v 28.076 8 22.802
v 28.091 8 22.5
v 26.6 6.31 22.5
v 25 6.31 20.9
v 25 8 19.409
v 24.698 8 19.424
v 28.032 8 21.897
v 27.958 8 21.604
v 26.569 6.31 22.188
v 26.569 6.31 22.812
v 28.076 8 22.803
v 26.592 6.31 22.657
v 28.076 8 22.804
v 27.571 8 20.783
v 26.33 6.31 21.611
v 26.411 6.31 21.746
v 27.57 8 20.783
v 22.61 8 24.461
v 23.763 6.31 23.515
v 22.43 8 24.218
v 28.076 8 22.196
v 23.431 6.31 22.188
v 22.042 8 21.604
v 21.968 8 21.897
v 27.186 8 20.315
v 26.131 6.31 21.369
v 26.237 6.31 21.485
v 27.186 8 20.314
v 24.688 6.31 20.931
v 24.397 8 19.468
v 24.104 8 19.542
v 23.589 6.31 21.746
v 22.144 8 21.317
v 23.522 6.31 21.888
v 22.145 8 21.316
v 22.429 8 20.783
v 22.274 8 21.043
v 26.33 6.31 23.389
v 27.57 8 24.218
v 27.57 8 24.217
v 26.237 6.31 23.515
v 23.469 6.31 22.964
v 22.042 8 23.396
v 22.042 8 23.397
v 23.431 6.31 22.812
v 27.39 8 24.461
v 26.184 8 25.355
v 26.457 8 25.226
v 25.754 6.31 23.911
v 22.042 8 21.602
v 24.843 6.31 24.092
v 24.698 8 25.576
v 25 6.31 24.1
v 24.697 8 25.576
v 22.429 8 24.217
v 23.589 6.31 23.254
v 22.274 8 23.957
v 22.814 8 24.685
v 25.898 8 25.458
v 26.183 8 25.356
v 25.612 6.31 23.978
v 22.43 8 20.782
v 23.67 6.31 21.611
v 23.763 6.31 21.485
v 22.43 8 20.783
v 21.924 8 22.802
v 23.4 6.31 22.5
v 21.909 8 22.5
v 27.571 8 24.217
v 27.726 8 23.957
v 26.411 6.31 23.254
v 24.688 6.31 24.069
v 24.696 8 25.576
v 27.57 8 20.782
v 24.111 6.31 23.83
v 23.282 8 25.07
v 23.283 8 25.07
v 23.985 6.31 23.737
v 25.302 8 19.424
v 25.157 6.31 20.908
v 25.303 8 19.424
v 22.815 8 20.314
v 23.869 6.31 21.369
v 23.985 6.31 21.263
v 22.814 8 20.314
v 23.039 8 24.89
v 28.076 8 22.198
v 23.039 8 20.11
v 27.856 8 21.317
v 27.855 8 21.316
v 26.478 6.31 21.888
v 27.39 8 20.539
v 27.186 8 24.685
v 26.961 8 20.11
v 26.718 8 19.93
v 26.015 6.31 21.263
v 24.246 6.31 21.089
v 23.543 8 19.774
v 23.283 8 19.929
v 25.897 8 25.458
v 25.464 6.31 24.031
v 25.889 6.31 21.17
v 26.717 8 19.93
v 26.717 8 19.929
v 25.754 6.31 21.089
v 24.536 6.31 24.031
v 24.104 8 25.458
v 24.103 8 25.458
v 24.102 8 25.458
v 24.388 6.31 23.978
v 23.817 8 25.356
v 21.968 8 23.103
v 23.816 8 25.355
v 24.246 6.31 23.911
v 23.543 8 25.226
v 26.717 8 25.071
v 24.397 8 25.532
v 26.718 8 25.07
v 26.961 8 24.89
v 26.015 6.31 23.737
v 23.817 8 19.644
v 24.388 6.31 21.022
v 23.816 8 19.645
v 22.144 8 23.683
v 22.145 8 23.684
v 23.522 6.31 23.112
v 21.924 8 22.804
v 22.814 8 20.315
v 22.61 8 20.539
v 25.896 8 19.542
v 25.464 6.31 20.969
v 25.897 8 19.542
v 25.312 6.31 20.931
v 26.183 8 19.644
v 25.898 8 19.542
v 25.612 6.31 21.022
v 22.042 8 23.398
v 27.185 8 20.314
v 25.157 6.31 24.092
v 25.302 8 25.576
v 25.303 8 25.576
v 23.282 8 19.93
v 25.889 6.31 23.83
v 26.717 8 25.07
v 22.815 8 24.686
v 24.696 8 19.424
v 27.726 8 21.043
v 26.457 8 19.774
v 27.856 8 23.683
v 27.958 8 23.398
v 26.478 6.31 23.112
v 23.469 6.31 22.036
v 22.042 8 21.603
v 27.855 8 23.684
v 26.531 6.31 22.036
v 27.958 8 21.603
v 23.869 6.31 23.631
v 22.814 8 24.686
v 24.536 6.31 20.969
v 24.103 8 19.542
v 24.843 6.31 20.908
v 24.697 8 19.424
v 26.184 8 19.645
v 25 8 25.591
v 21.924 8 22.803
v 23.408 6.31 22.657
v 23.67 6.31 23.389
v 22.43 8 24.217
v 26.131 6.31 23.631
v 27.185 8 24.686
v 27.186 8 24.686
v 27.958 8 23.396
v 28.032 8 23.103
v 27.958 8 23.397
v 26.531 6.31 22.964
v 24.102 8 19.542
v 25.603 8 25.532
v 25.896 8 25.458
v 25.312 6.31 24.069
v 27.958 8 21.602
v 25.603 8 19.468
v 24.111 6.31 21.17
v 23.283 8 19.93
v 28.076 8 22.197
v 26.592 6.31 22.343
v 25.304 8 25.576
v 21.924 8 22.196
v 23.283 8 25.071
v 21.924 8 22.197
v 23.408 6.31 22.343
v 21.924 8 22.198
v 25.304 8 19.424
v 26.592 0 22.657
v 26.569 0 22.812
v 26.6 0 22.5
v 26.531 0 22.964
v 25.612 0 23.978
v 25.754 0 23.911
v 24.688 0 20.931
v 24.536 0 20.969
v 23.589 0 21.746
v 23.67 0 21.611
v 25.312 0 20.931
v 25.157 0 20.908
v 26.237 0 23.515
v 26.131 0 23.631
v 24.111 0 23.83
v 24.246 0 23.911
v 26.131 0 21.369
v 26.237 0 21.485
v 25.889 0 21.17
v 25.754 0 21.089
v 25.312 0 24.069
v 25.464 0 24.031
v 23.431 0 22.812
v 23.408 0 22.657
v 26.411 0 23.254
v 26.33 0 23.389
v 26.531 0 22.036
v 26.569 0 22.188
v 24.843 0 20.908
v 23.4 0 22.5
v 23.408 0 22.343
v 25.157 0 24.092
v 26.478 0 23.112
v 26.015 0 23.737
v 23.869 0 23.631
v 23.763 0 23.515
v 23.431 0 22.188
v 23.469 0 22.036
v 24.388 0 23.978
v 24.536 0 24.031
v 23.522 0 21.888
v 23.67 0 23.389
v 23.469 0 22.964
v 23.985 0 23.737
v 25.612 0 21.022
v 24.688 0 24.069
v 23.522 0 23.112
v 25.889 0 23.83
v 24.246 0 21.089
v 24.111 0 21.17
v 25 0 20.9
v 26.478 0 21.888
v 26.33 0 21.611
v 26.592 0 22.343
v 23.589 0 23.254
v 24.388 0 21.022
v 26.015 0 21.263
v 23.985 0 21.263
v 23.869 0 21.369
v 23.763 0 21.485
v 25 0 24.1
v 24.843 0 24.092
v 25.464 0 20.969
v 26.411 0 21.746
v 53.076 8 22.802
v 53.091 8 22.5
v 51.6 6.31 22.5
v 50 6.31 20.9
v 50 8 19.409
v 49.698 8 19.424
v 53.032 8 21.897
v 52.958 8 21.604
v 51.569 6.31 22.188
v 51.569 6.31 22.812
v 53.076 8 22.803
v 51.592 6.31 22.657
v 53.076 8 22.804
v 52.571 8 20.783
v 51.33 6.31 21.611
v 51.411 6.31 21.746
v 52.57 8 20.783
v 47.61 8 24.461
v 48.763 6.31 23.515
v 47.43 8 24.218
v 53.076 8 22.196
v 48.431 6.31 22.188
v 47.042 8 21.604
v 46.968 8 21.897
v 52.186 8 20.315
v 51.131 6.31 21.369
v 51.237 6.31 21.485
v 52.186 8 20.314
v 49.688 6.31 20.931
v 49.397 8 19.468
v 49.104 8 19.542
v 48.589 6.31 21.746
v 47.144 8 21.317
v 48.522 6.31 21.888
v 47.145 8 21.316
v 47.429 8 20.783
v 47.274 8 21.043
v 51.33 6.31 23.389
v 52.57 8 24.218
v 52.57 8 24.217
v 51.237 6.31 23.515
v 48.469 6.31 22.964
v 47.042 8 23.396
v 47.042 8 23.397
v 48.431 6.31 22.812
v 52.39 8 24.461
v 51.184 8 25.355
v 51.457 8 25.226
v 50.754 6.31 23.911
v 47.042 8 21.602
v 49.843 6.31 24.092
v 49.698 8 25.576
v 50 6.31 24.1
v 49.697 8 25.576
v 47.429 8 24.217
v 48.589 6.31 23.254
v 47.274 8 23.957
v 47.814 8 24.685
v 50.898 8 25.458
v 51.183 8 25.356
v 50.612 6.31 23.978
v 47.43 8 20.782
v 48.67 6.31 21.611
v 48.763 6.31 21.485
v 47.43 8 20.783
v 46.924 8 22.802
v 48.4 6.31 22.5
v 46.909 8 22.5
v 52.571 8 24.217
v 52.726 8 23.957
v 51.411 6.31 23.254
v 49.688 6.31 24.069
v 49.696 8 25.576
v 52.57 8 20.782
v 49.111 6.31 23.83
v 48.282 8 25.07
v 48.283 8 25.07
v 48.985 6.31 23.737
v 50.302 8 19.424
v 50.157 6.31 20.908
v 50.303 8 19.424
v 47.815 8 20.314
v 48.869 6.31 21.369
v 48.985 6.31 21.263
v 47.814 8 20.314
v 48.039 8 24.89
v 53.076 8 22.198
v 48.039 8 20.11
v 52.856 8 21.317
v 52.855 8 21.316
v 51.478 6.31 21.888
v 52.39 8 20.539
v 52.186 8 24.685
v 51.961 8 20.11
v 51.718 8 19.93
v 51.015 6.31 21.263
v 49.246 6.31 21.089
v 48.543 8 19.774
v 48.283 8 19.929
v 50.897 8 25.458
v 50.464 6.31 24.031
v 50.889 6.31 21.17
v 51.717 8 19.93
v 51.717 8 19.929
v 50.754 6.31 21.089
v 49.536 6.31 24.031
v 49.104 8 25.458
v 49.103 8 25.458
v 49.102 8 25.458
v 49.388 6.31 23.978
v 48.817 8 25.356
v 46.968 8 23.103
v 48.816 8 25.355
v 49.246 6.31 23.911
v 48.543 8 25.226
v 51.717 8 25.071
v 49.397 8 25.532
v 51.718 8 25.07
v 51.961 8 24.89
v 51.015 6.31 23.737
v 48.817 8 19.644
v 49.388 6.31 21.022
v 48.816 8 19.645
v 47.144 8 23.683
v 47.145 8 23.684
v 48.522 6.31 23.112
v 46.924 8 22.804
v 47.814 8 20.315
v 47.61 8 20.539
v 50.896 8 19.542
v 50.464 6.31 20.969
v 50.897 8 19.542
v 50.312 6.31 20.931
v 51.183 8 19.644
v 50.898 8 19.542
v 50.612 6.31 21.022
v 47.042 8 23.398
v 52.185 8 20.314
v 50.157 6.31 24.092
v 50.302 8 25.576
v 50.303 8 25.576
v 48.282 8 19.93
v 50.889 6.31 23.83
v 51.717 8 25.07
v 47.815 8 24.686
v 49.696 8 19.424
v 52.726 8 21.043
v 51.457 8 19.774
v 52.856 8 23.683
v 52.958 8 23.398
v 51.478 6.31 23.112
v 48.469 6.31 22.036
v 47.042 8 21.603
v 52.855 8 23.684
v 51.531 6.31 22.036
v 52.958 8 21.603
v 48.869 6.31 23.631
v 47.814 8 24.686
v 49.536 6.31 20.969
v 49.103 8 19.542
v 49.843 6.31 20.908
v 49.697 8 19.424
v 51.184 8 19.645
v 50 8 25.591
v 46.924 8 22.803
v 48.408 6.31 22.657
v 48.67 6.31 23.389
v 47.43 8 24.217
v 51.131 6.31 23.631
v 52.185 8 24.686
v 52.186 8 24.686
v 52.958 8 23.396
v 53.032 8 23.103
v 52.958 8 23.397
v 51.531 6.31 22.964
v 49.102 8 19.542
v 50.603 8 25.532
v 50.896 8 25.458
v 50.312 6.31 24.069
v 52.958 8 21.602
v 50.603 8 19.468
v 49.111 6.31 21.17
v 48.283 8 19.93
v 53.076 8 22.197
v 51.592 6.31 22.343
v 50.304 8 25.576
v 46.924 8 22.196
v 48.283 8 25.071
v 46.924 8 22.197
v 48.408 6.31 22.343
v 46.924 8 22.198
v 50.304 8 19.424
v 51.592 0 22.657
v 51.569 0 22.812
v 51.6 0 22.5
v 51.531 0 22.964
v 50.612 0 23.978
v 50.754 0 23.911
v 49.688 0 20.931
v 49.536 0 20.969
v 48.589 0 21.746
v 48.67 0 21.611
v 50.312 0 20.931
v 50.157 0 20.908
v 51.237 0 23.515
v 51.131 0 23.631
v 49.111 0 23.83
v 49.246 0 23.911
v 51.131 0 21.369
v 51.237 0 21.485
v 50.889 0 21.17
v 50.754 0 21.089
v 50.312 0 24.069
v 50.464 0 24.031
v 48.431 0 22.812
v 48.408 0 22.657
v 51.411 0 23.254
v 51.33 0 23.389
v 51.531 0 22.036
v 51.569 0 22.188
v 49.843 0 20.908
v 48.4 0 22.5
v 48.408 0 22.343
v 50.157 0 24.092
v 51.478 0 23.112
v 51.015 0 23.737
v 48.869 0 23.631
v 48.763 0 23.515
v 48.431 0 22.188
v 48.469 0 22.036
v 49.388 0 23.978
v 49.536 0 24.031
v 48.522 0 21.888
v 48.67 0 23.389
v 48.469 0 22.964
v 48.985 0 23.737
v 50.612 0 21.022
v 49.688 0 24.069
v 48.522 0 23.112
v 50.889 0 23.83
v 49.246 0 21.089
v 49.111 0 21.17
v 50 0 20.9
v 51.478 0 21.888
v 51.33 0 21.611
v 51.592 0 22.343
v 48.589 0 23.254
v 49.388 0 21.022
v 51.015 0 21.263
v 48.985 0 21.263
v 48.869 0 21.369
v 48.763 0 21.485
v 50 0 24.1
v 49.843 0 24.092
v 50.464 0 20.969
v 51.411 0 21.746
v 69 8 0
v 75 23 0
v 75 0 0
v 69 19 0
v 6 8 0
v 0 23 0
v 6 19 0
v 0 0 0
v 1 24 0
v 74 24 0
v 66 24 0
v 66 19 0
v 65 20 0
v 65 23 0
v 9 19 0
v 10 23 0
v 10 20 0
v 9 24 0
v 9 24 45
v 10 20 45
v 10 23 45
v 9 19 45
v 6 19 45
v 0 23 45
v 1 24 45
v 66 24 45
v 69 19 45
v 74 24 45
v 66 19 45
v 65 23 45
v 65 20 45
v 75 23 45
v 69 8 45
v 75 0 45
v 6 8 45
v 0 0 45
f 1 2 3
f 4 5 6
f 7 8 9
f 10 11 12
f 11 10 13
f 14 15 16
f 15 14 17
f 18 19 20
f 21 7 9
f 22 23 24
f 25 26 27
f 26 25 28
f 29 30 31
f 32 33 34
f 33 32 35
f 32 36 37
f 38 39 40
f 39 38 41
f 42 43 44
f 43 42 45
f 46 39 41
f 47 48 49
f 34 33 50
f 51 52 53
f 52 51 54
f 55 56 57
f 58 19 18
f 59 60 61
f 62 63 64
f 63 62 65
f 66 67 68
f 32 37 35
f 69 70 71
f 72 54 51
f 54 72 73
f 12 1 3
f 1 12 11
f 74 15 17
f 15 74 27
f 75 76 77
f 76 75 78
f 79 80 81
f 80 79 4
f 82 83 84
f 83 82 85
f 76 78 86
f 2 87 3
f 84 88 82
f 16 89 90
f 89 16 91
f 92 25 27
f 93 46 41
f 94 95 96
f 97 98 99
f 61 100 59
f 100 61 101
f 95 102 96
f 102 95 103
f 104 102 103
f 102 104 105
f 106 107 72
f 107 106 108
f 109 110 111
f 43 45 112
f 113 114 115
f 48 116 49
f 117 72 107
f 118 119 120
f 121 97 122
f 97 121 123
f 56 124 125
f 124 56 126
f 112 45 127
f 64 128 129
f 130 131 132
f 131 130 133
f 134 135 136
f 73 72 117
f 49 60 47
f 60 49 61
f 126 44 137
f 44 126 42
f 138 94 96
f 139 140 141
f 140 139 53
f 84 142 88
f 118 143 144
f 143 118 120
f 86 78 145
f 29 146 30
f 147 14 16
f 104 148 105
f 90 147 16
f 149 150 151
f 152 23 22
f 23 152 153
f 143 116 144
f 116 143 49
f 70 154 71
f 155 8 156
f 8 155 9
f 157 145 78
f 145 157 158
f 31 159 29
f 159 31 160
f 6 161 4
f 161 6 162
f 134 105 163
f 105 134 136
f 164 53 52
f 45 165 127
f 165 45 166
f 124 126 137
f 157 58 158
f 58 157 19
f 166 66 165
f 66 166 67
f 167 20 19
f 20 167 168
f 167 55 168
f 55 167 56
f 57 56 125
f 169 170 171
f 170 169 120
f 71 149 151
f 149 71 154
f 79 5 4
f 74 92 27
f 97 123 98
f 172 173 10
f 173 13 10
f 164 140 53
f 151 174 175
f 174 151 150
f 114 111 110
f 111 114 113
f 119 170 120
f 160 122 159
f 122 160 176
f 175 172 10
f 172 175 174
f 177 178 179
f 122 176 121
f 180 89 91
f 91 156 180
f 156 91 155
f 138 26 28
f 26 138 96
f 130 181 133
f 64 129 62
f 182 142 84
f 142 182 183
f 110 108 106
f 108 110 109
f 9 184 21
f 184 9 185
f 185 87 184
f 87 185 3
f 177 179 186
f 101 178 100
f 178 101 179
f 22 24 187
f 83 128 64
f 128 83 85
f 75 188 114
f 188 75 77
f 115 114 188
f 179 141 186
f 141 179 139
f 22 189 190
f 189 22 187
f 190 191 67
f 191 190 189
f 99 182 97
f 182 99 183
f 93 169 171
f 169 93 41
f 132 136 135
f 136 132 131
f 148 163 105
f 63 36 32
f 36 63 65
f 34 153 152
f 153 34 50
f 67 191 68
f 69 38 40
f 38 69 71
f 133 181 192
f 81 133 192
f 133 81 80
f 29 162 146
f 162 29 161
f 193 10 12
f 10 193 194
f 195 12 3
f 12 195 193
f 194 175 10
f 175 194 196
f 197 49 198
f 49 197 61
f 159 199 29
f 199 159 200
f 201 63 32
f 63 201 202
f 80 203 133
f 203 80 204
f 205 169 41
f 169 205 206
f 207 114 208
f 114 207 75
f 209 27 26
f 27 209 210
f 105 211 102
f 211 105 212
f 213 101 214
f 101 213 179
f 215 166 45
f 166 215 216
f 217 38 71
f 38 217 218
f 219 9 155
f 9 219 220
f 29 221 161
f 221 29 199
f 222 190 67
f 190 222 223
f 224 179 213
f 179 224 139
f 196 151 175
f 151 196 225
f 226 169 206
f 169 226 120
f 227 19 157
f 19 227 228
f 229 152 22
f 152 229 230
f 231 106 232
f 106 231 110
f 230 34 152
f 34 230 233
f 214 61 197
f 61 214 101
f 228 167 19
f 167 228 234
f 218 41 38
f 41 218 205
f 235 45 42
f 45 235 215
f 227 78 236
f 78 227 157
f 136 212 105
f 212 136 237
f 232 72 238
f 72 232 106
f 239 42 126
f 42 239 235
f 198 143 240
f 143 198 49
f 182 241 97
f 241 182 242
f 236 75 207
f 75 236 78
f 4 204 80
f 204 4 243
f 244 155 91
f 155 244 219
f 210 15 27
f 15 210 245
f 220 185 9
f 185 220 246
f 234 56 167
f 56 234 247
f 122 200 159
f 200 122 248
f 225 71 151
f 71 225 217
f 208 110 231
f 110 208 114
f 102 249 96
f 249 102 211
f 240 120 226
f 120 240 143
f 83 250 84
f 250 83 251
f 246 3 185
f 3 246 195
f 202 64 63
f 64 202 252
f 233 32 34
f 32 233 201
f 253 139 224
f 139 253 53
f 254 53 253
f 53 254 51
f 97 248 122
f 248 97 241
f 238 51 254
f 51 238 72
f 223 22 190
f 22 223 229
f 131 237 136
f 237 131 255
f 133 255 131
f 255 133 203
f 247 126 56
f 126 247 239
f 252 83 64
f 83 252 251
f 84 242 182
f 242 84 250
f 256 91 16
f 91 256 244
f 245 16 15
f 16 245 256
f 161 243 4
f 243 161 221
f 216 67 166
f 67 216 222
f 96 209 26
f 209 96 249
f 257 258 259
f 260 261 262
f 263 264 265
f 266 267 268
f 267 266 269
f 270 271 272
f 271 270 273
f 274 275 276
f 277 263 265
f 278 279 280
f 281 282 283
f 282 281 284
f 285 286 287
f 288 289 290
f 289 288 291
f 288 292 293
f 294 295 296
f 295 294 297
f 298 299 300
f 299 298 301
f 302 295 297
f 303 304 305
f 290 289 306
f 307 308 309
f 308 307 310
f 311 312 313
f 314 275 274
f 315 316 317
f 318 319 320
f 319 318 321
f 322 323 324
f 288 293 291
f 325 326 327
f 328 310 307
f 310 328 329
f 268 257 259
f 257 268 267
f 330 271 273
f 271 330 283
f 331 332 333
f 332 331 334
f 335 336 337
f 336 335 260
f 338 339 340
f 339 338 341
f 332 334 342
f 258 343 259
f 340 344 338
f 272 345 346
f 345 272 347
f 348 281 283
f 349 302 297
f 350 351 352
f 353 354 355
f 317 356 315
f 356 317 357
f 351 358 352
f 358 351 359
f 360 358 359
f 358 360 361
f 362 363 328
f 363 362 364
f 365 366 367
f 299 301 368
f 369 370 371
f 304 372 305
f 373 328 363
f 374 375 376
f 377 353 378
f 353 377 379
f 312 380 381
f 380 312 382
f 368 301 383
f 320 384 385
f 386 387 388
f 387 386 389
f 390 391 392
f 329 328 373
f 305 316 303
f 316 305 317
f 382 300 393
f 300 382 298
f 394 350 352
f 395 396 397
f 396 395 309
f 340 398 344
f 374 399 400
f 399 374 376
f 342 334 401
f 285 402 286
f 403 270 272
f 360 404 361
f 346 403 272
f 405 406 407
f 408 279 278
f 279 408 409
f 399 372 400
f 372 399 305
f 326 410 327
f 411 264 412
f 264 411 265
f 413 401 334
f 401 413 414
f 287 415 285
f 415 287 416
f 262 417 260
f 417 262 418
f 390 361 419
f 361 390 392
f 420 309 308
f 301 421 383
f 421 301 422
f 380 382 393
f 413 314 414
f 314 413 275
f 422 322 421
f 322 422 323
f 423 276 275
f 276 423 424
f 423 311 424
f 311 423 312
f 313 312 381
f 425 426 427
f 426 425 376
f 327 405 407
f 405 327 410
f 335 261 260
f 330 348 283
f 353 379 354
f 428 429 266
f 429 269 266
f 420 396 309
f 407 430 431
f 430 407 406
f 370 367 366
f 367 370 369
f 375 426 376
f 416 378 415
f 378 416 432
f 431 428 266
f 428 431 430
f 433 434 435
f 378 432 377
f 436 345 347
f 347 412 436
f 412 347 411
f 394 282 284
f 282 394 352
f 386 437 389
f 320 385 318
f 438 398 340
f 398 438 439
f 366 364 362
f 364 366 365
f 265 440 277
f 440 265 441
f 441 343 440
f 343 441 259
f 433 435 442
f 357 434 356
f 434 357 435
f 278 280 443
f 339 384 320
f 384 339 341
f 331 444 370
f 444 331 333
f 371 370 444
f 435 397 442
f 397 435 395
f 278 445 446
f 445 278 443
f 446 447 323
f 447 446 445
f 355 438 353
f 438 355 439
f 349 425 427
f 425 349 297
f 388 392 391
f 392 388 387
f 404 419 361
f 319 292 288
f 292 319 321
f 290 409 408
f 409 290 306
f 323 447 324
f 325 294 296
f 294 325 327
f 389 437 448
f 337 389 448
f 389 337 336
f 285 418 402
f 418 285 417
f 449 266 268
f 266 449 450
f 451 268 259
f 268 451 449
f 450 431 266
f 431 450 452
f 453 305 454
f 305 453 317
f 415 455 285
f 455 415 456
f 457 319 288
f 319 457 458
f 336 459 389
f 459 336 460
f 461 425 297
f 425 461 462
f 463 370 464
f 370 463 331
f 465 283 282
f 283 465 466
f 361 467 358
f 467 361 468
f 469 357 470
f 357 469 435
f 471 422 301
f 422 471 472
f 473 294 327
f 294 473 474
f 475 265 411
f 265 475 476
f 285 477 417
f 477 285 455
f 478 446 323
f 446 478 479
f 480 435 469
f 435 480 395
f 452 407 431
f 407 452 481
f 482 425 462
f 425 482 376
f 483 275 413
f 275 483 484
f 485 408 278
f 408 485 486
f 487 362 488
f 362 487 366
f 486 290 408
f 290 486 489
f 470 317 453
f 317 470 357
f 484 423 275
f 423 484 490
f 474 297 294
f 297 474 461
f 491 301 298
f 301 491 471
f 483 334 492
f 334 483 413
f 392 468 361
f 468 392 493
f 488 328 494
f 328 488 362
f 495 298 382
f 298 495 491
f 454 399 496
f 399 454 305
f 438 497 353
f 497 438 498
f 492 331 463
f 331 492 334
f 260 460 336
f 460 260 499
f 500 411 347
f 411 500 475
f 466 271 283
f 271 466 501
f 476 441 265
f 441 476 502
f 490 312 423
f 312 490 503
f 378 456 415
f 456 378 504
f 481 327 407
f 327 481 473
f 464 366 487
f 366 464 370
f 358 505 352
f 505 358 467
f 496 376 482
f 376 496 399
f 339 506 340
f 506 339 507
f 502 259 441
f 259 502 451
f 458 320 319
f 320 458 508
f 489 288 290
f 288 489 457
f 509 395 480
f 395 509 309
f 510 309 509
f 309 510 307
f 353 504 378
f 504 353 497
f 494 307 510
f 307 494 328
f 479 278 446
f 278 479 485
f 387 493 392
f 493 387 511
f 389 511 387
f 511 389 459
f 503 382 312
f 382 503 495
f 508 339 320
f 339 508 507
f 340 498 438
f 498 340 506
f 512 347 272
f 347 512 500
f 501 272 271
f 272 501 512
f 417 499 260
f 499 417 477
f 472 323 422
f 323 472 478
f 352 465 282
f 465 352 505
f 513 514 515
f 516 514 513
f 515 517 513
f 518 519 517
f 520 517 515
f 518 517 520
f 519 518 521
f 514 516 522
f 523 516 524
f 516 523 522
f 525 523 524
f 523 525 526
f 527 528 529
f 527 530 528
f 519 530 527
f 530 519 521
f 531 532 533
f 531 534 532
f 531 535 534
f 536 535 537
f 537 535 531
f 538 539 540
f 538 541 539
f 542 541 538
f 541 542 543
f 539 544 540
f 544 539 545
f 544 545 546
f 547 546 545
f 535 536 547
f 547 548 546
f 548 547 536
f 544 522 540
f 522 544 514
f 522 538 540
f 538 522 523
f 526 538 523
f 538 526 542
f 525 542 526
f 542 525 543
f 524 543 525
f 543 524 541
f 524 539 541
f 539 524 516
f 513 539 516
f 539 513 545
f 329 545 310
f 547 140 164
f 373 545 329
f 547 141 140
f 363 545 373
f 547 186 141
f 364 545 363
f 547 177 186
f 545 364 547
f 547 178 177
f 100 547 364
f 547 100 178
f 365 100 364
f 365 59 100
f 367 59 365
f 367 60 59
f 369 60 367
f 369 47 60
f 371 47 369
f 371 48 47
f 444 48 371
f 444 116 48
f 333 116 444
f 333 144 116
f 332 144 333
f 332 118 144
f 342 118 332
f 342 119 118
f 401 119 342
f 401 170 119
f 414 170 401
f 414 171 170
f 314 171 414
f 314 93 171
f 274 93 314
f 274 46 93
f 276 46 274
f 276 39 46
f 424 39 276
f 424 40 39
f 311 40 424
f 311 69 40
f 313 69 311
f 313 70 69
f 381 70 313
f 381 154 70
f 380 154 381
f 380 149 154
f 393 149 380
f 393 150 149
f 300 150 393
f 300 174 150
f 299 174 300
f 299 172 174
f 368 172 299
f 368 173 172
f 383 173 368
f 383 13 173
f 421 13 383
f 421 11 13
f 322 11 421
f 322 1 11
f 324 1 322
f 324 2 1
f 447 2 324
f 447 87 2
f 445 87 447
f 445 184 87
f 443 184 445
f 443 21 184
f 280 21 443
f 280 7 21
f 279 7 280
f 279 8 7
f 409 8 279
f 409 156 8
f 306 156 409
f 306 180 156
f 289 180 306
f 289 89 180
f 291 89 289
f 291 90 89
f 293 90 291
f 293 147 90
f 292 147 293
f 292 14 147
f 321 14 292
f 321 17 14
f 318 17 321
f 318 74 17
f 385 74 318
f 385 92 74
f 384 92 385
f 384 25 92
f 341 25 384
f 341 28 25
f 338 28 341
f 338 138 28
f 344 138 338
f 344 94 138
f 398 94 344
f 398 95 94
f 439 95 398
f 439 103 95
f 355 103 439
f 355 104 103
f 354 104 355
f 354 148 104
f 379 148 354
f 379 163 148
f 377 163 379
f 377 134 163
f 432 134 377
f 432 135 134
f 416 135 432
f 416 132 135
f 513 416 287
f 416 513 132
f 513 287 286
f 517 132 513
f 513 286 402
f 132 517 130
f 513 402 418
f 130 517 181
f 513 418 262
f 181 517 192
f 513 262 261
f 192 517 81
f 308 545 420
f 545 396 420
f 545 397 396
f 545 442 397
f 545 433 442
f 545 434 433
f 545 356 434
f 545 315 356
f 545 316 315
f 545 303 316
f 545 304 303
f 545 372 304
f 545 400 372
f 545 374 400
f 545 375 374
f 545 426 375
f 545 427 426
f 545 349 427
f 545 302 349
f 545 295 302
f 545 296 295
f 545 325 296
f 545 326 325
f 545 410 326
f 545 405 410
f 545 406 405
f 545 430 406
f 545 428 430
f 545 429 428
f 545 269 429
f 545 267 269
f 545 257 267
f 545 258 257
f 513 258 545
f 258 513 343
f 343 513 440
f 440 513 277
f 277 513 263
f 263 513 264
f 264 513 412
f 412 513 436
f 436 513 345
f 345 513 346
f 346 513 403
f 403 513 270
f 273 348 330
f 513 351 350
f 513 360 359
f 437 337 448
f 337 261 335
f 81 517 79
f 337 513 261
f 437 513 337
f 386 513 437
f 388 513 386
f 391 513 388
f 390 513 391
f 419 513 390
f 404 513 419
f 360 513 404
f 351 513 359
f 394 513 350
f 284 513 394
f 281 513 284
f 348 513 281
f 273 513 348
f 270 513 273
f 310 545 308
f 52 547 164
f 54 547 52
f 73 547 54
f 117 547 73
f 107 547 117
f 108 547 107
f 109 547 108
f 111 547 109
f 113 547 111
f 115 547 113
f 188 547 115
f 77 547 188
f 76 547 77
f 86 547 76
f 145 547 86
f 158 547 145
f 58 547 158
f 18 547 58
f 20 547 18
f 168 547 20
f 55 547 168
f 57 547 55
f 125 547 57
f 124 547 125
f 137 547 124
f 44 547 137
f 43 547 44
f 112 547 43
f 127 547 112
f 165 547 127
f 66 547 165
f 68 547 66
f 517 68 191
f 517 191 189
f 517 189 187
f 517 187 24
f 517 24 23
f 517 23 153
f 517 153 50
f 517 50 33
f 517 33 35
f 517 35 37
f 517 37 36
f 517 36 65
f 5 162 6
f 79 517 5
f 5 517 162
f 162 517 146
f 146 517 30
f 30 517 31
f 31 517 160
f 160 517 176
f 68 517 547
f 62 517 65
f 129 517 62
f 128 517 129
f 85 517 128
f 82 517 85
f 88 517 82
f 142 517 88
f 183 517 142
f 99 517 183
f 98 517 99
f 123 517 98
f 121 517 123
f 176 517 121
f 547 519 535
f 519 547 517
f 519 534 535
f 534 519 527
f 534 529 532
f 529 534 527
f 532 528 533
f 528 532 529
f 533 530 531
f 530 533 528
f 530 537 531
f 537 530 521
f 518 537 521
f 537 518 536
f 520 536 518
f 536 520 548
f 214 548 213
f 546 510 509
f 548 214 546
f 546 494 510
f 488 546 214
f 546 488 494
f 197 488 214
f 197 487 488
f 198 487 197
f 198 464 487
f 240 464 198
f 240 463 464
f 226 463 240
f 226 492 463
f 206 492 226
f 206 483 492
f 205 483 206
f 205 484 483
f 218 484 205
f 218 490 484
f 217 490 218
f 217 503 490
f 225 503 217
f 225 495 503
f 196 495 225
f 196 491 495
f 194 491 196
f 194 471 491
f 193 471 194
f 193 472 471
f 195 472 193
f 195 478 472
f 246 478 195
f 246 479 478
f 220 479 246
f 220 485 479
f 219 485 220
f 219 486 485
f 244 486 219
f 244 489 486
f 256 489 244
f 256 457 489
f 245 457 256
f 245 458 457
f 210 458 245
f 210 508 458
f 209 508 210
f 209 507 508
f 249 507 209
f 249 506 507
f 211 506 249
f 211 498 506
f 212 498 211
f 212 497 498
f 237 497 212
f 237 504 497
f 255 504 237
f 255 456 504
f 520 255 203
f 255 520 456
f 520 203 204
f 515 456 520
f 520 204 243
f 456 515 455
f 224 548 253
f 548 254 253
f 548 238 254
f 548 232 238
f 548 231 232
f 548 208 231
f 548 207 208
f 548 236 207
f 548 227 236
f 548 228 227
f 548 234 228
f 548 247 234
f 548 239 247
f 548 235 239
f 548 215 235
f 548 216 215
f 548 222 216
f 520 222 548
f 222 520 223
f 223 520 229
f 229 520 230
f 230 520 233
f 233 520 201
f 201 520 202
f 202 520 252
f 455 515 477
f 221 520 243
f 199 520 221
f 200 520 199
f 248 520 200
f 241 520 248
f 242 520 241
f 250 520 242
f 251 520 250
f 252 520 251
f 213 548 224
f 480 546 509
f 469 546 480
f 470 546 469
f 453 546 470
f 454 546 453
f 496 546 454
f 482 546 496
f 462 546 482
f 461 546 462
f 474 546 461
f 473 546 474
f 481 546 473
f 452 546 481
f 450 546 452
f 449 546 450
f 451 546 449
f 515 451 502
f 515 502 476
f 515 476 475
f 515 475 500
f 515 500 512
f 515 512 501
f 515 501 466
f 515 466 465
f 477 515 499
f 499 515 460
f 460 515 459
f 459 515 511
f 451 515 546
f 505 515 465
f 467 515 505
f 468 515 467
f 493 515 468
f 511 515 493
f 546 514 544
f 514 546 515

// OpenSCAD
/**************************************************************
 * Parametric battery holder version 1            (2023-05-03)*
 * Copyright (c) Tomas "Arci" Kouba, 2023                     * 
 * ---------------------------------------------------------- *
 * Licensed under terms of the                                *
 * Creative Commons Attribution-NonCommercial-ShareAlike 4.0  *
 * International (CC BY-NC-SA 4.0) license                    *
 * ---------------------------------------------------------- *
 * History:                                                   *
 *  1.0 (2023-05-03):                                         *
 *    * Created                                               *
 **************************************************************/
 

// Default values are for Makita 18V
/*[Model]*/
// Create test shape instead on holder
type = "holder"; // [holder, dimensioned, test]
/*[Battery]*/
// Battery total width
batteryWidth = 75;
// Width of battery lock rails
holderWidth = 63;
// Height if battery lock rails
holderHeight = 16;
// Length of battery lock rails
holderLength = 45;
// Nose under lock rails height
noseHeight = 5;
// Nose under lock rails 
noseWidth = 4;
/*[Holes]*/
// Hole size for srew Mx
holeSize = 3; // [3,4,5]
// Number of holes
holes = 2; // [1,2]
/*[Base]*/
baseHeight = 8;
bevel = 1;

/*[Hidden]*/
$fudge = 0.01;

$fn = $preview ? $fn : 64;

holderWall = (batteryWidth - holderWidth) / 2;
screwHoleSizes = [
  //[hole diameter, d2, k max]
  [3.2, 6.2, 1.7],
  [4.2, 8.2, 1.9],
  [5.2, 10.3, 2.4]
];
battPoly = [
  [0, 0],
  [batteryWidth, 0],
  [batteryWidth, baseHeight + holderHeight - bevel],
  [batteryWidth - bevel, baseHeight + holderHeight],
  [batteryWidth - holderWall - noseWidth + bevel, baseHeight + holderHeight],
  [batteryWidth - holderWall - noseWidth, baseHeight + holderHeight - bevel],
  [batteryWidth - holderWall - noseWidth, baseHeight + holderHeight - noseHeight + bevel],
  [batteryWidth - holderWall - noseWidth + bevel, baseHeight + holderHeight - noseHeight],
  [batteryWidth - holderWall, baseHeight + holderHeight - noseHeight],
  [batteryWidth - holderWall, baseHeight],
  [holderWall, baseHeight],
  [holderWall, baseHeight + holderHeight - noseHeight],
  [holderWall + noseWidth - bevel, baseHeight + holderHeight - noseHeight],
  [holderWall + noseWidth, baseHeight + holderHeight - noseHeight + bevel],
  [holderWall + noseWidth, baseHeight + holderHeight - bevel],
  [holderWall + noseWidth - bevel, baseHeight + holderHeight],
  [bevel, baseHeight + holderHeight],
  [0, baseHeight + holderHeight - bevel],
];

if (type == "test") {
  linear_extrude(3) polygon(battPoly);
}
if ((type == "holder") || (type == "dimensioned")) {
  difference(){
    linear_extrude(holderLength) polygon(battPoly);
    for (i = [1:1:holes])
      translate([batteryWidth/(holes+1)*i, baseHeight+$fudge, holderLength/2])
        rotate([90,0,0]){
          screwHole(
            screwHoleSizes[holeSize-3][0],
            screwHoleSizes[holeSize-3][1],
            screwHoleSizes[holeSize-3][2],
            baseHeight + 2*$fudge);
        }
  }
  if (type == "dimensioned" && $preview) {
    translate([0, 0, holderLength])
      rotate([-90,0,0]) measurement_line(batteryWidth, "batteryWidth", spacer = 10);
    translate([holderWall, baseHeight + 2, holderLength])
      rotate([-90,0,0]) measurement_line(holderWidth, "holderWidth", direction="dn", spacer = 1);    
    translate([0, baseHeight, holderLength])
      rotate([-90,0,90]) measurement_line(holderHeight, "holderHeight", direction="dn", spacer = 10);
    translate([batteryWidth - holderWall - noseWidth, baseHeight + holderHeight - noseHeight, holderLength])
      rotate([-90,0,90]) measurement_line(noseHeight, "noseHeight", direction="dn", spacer = 10, halign = "left");    
    translate([holderWall, baseHeight + holderHeight, holderLength])
      rotate([-90,0,0]) measurement_line(noseWidth, "noseWidth", direction="dn", spacer = 10);    
    rotate([0,-90,0]) measurement_line(holderLength, "holderLength", direction="dn", spacer = 10);        
  }
}


module screwHole(d1, d2, k, l)
{
  union() {
    cylinder(h=k,d1=d2,d2=d1);
    cylinder(h=l,d=d1);
  }
}

module measurement_line(length,text,direction="up",spacer=10,line_thickness=0.2,halign="center")
{
	color("Black")
	{ 
    translate([0,0, direction=="up" ? -spacer : spacer])
      cube([length,line_thickness,line_thickness]);
		translate([0,0, direction=="up" ? -spacer-1 : 0]) 
			cube([line_thickness,line_thickness,spacer+1]);
		translate([length-line_thickness,0,direction=="up" ? -spacer-1 : 0 ]) 
			cube([line_thickness,line_thickness,spacer+1]);

		translate([length/2,0,direction=="up" ? -spacer+1 : spacer+1]) rotate([90,0,0]) 
			text(str(text,"=", length),size=2, halign=halign, valign = "bottom");
	}
}
